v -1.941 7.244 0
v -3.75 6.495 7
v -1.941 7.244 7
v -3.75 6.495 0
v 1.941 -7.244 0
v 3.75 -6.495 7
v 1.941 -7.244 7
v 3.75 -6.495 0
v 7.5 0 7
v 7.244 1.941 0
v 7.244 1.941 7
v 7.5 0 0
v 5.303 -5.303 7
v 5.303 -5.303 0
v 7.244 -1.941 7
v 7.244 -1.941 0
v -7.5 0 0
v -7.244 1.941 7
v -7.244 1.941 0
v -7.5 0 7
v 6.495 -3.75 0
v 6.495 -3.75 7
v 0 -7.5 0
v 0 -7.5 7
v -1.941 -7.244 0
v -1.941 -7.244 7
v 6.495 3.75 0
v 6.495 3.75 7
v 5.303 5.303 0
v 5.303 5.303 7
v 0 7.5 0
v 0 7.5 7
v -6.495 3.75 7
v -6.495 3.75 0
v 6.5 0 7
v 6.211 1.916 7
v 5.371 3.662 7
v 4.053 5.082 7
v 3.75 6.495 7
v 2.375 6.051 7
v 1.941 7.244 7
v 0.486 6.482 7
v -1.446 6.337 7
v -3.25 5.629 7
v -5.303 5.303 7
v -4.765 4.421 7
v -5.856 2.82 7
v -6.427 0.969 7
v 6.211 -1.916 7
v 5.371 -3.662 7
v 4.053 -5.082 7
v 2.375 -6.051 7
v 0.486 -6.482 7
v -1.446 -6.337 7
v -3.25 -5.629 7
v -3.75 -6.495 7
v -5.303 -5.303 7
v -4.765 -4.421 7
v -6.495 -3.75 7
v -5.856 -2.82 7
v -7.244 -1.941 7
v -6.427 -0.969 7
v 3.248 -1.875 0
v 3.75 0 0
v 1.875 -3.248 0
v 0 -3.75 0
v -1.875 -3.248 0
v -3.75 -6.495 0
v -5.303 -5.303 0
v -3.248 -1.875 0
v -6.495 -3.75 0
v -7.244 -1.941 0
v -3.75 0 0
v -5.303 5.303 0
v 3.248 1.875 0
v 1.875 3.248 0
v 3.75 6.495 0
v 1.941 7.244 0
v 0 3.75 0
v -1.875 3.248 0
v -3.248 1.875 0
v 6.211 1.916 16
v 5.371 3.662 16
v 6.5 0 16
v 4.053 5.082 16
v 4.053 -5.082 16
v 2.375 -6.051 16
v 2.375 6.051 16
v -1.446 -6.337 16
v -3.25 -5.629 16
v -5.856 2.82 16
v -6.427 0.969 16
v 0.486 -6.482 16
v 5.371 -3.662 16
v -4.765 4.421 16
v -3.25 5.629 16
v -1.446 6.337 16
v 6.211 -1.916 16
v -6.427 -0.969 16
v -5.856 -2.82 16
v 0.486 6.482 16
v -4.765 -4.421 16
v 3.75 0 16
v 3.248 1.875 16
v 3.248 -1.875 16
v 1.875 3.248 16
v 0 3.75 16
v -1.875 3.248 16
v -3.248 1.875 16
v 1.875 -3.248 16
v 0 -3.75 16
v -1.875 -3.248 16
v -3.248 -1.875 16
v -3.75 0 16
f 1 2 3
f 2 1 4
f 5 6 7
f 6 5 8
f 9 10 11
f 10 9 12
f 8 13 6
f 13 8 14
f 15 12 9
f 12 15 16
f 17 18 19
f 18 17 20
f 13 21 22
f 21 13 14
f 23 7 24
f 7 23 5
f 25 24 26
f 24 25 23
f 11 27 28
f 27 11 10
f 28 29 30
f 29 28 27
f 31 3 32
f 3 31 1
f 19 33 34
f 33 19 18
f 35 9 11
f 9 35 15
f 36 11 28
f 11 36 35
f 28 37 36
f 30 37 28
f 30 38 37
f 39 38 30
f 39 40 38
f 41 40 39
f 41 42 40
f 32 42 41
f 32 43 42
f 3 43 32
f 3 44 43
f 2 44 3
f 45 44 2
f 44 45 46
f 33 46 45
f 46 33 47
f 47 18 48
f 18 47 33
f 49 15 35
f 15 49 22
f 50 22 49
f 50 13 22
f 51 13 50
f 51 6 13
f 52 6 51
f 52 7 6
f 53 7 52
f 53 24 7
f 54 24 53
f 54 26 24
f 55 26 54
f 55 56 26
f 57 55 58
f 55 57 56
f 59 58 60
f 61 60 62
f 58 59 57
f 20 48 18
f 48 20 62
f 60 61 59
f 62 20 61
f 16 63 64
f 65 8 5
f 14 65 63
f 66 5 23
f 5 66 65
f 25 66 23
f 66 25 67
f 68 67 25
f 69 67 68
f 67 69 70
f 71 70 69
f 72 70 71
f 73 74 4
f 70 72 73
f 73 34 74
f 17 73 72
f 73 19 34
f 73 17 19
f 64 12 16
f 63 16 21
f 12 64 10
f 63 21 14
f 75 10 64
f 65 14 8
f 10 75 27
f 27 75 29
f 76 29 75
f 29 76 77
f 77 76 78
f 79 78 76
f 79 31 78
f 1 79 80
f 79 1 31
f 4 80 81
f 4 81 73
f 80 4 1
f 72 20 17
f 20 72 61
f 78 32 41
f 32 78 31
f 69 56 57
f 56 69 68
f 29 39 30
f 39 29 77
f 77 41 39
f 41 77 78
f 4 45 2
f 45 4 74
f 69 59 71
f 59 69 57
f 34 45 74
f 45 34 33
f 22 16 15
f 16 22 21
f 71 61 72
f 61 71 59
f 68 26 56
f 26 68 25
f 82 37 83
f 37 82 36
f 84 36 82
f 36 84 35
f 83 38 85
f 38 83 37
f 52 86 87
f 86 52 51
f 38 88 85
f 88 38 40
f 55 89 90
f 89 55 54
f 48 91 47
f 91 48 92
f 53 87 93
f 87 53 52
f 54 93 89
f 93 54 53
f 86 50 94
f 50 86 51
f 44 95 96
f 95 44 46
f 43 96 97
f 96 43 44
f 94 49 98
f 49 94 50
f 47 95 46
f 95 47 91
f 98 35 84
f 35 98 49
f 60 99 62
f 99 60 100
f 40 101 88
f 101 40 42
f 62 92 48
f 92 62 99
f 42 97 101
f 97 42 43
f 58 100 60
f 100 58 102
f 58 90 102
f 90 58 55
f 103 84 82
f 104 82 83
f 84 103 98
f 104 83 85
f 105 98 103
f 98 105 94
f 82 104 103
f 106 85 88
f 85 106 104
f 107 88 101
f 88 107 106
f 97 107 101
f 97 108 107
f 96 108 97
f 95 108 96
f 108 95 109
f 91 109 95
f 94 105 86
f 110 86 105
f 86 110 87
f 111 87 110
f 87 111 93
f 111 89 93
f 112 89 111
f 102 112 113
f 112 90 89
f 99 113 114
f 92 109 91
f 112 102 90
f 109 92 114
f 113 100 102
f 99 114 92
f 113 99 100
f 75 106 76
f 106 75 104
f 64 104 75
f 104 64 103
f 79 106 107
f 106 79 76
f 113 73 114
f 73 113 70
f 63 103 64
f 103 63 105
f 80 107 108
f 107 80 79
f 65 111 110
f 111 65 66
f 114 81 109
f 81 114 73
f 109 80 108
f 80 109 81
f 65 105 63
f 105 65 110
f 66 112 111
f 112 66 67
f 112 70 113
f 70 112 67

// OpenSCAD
/*###################################################################################
#	Stepped actuator model
#
# Not much more to say so far
# Change the HEAD_OD variable to adjust outer diameter
# That's it
#
##################################################################################*/

// Inner diameter/shaft diameter
ID=7.5;
// Slim part
BASE_OD=13;
BASE_HEIGHT=9;
// Not slim part
HEAD_OD=15 ;    //Modify this
HEAD_HEIGHT=7;

module base()
{
    color("#FF0000")
        cylinder(BASE_HEIGHT, BASE_OD/2, BASE_OD/2);
}

module head()
{
    color("#0000FF")
        cylinder(HEAD_HEIGHT, HEAD_OD/2, HEAD_OD/2);
}

module innerBore()
{
    color("#00FF00")
        cylinder(BASE_HEIGHT + HEAD_HEIGHT, ID/2, ID/2);
}

difference()
{
    union()
    {
        head();
        translate([0, 0, HEAD_HEIGHT])
            base();
    }
    innerBore();
}
